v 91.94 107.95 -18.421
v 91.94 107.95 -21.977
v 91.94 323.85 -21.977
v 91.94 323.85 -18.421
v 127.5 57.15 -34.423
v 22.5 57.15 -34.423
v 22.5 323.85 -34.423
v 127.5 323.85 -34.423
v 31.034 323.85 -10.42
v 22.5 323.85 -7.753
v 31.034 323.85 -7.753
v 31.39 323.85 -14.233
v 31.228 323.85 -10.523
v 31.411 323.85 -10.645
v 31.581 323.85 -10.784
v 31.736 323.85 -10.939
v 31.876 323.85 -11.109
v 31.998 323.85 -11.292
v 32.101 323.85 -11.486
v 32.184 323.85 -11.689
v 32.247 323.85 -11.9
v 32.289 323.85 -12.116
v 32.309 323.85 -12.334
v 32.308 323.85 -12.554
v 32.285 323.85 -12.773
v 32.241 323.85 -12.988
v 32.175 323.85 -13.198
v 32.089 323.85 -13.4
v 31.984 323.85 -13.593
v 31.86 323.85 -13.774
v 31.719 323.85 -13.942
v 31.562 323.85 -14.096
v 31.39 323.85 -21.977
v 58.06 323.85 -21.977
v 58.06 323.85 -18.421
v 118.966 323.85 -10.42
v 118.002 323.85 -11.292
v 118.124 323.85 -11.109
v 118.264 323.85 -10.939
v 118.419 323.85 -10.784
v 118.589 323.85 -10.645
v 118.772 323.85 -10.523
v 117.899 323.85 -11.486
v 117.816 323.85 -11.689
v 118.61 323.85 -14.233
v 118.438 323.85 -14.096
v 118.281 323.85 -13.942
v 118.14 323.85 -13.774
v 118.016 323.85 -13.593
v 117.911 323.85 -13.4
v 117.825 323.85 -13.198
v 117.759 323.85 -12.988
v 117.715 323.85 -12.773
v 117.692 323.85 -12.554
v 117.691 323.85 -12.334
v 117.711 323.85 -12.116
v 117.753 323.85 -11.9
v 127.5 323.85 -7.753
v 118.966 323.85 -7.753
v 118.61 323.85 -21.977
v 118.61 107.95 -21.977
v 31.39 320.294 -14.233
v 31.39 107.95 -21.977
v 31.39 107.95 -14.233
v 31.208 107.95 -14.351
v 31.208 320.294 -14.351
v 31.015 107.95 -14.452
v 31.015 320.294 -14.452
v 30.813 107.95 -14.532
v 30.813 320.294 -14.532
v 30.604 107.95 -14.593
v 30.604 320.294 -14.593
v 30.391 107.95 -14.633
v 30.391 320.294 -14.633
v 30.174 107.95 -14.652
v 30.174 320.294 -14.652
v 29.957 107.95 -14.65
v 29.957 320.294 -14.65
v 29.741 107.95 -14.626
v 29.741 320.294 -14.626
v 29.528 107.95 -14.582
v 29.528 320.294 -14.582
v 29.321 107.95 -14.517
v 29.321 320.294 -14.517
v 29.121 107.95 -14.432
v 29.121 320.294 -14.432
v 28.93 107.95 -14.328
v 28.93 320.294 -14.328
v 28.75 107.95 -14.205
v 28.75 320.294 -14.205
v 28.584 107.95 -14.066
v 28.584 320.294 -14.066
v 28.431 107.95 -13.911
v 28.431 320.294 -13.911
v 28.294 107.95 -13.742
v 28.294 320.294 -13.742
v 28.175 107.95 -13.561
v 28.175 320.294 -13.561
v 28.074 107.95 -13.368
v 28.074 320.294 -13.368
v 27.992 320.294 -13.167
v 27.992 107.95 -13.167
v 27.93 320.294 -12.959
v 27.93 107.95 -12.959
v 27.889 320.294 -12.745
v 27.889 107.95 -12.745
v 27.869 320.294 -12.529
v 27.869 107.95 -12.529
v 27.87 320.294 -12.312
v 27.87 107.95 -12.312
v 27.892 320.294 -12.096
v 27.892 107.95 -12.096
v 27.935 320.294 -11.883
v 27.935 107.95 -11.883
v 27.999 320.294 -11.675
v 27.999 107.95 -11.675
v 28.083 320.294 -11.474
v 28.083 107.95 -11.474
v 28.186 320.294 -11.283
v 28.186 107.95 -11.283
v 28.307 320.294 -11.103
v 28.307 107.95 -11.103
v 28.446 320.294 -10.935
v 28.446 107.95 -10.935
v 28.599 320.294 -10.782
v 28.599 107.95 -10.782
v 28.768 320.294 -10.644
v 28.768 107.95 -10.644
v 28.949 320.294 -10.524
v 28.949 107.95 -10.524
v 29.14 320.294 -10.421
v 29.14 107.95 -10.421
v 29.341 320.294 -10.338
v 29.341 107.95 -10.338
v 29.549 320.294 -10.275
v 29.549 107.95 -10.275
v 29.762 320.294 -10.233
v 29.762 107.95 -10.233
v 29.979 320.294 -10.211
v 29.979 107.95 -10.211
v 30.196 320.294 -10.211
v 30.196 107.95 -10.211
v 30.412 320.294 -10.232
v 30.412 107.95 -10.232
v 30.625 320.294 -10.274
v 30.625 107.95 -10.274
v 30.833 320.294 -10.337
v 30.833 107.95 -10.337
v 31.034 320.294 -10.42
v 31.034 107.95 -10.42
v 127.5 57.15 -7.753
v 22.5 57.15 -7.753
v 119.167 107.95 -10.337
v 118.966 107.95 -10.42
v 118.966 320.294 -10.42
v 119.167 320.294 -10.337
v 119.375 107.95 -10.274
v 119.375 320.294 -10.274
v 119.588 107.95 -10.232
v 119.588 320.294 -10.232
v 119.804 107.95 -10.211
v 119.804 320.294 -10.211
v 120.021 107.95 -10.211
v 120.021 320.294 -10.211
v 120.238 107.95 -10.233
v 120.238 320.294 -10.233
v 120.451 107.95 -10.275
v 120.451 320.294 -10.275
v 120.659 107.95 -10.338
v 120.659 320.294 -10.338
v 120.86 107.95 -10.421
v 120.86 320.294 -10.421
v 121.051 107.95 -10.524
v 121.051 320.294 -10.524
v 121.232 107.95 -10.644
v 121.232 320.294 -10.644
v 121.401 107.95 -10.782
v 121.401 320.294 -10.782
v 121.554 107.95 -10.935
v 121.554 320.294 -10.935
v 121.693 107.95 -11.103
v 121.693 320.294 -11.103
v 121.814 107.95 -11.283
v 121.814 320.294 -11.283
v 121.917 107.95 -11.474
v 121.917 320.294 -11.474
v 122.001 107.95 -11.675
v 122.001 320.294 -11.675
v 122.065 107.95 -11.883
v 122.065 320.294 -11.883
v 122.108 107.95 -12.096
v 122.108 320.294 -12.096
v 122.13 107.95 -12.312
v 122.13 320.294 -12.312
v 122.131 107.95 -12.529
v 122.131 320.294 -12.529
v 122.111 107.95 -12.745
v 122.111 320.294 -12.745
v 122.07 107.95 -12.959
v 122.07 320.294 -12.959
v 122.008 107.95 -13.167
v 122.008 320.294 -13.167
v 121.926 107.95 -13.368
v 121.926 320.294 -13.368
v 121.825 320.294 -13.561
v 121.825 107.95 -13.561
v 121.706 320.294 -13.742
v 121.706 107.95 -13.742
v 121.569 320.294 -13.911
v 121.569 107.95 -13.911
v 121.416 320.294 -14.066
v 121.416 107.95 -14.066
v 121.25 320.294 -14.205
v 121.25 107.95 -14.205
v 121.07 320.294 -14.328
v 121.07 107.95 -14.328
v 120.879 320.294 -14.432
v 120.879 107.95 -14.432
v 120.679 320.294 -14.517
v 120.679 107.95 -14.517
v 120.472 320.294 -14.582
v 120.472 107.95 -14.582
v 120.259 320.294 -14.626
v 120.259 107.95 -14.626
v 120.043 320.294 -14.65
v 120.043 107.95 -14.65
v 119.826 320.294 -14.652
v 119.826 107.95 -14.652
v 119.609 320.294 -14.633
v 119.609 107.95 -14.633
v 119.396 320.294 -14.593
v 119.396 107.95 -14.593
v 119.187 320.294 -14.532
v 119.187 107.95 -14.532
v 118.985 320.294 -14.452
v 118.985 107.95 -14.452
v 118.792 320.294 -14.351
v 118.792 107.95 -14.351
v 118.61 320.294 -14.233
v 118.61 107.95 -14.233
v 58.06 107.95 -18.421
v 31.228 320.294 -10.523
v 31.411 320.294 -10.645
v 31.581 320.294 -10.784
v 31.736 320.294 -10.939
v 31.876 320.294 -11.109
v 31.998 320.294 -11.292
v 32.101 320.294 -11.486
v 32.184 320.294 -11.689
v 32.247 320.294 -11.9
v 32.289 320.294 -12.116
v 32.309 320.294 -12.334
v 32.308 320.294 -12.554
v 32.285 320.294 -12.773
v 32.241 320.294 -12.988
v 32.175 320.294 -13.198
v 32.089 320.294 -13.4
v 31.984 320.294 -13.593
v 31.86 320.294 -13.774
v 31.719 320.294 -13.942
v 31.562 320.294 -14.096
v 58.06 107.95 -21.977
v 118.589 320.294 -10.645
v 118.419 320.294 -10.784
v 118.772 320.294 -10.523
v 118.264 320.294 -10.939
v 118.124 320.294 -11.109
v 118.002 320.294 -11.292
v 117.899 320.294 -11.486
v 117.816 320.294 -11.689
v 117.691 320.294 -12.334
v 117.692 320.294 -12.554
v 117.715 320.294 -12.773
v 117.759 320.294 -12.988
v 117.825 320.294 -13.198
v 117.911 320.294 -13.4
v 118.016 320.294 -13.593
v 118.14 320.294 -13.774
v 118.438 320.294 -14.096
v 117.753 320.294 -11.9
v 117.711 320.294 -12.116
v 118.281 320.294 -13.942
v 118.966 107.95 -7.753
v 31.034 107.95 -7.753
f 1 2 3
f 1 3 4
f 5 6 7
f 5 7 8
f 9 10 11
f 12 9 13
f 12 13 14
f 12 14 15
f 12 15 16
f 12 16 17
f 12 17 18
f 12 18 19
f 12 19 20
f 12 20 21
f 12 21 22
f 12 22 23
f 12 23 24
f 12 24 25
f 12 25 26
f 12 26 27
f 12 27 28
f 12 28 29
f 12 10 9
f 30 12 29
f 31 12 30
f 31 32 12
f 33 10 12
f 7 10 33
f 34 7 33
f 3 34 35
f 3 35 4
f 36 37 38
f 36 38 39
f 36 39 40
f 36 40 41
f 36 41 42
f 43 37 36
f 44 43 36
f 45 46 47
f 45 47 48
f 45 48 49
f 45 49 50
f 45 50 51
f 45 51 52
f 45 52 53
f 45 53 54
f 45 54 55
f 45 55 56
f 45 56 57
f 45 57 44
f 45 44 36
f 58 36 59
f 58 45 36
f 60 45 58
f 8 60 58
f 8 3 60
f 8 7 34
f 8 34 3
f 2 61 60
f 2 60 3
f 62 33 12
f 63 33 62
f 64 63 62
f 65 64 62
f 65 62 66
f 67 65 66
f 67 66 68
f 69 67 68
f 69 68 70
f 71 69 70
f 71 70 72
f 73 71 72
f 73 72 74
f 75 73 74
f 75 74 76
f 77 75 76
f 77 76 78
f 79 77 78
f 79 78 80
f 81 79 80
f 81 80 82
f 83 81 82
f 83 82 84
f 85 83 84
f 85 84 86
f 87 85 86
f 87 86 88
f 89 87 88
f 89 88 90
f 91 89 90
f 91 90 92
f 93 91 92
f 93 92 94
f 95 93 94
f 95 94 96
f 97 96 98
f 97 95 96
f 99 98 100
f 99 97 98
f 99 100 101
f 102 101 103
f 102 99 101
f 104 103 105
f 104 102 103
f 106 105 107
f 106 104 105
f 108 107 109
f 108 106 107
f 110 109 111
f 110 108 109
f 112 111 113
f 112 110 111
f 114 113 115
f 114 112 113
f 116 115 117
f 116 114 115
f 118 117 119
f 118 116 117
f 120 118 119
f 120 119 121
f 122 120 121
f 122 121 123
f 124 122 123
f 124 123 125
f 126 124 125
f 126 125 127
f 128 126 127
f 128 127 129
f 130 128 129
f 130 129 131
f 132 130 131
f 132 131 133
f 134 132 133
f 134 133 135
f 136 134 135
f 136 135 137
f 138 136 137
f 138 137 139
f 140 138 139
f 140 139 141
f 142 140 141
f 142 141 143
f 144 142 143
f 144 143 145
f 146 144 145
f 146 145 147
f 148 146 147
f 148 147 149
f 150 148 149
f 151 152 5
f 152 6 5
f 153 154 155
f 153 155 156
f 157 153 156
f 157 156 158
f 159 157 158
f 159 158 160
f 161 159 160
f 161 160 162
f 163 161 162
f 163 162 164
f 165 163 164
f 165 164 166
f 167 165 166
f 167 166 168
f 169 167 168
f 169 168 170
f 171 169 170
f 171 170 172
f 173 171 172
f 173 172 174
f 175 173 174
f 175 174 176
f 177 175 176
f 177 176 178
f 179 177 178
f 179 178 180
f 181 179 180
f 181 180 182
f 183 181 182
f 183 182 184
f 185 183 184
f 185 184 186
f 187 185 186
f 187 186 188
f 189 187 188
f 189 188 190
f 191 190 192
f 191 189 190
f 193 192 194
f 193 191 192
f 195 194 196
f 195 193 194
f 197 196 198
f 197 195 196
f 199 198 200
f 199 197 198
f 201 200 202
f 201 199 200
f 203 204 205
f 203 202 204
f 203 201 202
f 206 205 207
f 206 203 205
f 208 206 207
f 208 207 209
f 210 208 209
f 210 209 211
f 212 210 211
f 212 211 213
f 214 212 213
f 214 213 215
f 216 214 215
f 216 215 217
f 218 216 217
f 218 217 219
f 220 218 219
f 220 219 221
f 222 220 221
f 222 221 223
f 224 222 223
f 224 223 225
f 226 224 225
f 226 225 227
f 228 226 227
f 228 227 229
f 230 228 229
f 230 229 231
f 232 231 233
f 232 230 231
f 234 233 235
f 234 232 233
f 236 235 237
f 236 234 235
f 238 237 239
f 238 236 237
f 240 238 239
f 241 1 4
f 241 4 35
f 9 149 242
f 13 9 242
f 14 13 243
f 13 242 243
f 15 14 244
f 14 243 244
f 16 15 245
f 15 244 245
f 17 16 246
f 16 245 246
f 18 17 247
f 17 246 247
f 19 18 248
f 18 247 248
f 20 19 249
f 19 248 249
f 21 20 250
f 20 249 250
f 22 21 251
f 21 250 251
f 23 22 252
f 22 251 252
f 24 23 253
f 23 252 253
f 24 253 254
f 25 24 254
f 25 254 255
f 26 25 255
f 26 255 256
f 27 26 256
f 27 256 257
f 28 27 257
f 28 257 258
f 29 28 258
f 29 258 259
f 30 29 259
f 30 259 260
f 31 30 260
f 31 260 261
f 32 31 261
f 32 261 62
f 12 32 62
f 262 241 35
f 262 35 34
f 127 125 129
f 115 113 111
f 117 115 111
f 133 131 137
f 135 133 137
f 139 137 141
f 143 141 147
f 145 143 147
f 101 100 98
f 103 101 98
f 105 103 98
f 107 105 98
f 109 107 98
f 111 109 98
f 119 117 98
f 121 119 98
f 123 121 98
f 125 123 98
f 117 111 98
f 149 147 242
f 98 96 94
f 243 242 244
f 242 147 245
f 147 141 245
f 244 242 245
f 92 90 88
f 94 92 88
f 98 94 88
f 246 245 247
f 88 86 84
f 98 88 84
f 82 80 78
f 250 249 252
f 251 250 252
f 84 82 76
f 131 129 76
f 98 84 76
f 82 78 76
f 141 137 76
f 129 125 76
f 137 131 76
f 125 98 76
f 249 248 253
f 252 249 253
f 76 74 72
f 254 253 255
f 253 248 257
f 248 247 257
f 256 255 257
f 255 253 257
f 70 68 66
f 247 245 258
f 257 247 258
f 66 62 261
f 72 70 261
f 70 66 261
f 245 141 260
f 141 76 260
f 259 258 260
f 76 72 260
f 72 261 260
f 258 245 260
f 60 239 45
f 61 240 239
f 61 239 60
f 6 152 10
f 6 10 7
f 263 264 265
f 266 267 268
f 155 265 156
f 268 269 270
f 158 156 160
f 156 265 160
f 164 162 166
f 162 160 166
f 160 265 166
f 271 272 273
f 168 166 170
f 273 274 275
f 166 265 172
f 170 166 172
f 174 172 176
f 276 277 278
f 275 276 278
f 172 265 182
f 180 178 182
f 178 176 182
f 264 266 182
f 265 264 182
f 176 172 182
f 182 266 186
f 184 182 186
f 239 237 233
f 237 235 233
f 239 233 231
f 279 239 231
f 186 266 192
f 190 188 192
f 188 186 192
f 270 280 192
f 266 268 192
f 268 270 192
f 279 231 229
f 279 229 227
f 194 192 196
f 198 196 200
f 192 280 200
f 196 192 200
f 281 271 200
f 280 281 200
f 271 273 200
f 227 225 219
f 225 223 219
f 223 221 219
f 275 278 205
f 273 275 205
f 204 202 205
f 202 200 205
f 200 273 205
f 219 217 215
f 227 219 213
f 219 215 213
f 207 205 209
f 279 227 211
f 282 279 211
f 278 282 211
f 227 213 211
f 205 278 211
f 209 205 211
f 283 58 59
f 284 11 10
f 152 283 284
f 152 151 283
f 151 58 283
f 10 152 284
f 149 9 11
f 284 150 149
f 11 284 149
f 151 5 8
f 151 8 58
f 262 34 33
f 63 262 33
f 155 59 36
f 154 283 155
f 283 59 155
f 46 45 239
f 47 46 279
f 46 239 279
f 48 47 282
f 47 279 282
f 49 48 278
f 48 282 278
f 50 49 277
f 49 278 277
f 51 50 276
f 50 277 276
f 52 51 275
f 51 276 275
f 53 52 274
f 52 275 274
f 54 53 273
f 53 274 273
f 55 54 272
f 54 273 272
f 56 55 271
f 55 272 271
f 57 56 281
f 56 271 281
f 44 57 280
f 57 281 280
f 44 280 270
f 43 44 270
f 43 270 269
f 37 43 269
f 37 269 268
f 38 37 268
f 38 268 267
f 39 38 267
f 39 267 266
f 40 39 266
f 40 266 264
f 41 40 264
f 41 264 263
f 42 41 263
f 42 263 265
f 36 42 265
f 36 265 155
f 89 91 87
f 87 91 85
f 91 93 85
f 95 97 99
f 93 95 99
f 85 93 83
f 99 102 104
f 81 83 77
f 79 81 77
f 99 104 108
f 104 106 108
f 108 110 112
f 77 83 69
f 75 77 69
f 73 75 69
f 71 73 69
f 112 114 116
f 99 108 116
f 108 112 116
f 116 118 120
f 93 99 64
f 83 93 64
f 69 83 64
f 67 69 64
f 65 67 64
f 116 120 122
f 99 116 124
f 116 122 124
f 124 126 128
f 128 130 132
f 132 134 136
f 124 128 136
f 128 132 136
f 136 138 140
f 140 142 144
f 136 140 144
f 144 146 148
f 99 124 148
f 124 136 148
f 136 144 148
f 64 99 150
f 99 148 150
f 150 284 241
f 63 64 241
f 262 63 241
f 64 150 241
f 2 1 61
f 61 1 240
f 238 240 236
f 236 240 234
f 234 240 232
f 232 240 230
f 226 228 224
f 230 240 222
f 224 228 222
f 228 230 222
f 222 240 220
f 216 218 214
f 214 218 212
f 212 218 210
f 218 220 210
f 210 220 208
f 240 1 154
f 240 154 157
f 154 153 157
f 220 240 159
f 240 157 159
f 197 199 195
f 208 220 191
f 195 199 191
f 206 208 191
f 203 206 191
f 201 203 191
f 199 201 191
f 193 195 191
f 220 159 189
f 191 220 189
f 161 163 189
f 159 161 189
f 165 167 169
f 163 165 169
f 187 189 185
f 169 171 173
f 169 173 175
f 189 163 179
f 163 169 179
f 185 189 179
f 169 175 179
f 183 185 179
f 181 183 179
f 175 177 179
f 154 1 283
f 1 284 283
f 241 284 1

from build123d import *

# Parameters (mm, degrees)
BOSS_EXTRUDE1_DEPTH = 381
SKETCH4_R           = 3.175
BOSS_EXTRUDE2_DEPTH = 5.08
BOSS_EXTRUDE3_START = -5.08
SKETCH5_R           = 3.175
BOSS_EXTRUDE3_DEPTH = 5.08
SCALE1_SCALE        = 0.7
SKETCH8_W           = 105
SKETCH8_H           = 26.67
BOSS_EXTRUDE6_DEPTH = 50.8


with BuildPart() as part:
    # Sketch3 → Boss-Extrude1 (new body)
    with BuildSketch(Plane(origin=(0, 0, 0), x_dir=(1, 0, 0), z_dir=(0, 1, 0))):
        with BuildLine():
            Line((0, 0), (0, 38.1))
            Line((0, 38.1), (150, 38.1))
            Line((150, 38.1), (150, 0))
            Line((150, 0), (137.808, 0))
            Line((137.808, 0), (137.808, 3.81))
            ThreePointArc((137.808, 3.81), (142.319844489, 6.978228189), (137.3, 9.257607897))
            Line((137.3, 9.257607897), (137.3, 20.32))
            Line((137.3, 20.32), (99.2, 20.32))
            Line((99.2, 20.32), (99.2, 15.24))
            Line((99.2, 15.24), (50.8, 15.24))
            Line((50.8, 15.24), (50.8, 20.32))
            Line((50.8, 20.32), (12.7, 20.32))
            Line((12.7, 20.32), (12.7, 9.257607897))
            ThreePointArc((12.7, 9.257607897), (7.680155511, 6.978228189), (12.192, 3.81))
            Line((12.192, 3.81), (12.192, 0))
            Line((12.192, 0), (0, 0))
        make_face()
    extrude(amount=BOSS_EXTRUDE1_DEPTH)

    # Sketch4 → Boss-Extrude2 (add)
    with BuildSketch(Plane(origin=(0, 0, 0), x_dir=(1, 0, 0), z_dir=(0, 1, 0))):
        with Locations((10.841440118, 6.683432269)):
            Circle(SKETCH4_R)
        with Locations((139.158559882, 6.683432269)):
            Circle(SKETCH4_R)
    extrude(amount=BOSS_EXTRUDE2_DEPTH)

    # Sketch5 → Boss-Extrude3 (add)
    with BuildSketch(Plane(origin=(0, 381, 0), x_dir=(1, 0, 0), z_dir=(0, 1, 0)).offset(BOSS_EXTRUDE3_START)):
        with Locations((139.158559882, 6.683432269)):
            Circle(SKETCH5_R)
        with Locations((10.841440118, 6.683432269)):
            Circle(SKETCH5_R)
    extrude(amount=BOSS_EXTRUDE3_DEPTH)


with BuildPart() as part_1:
    # Scale1: scaled about (75, 190.5, -25.842389862)
    add(part.part.scale(SCALE1_SCALE).moved(Location((22.5, 57.15, -7.752716959))))

    # Sketch8 → Boss-Extrude6 (add)
    with BuildSketch(Plane.XZ.offset(-57.15)):
        with Locations((75, -21.087716959)):
            Rectangle(SKETCH8_W, SKETCH8_H)
    extrude(amount=-BOSS_EXTRUDE6_DEPTH)


solid = part_1.part
